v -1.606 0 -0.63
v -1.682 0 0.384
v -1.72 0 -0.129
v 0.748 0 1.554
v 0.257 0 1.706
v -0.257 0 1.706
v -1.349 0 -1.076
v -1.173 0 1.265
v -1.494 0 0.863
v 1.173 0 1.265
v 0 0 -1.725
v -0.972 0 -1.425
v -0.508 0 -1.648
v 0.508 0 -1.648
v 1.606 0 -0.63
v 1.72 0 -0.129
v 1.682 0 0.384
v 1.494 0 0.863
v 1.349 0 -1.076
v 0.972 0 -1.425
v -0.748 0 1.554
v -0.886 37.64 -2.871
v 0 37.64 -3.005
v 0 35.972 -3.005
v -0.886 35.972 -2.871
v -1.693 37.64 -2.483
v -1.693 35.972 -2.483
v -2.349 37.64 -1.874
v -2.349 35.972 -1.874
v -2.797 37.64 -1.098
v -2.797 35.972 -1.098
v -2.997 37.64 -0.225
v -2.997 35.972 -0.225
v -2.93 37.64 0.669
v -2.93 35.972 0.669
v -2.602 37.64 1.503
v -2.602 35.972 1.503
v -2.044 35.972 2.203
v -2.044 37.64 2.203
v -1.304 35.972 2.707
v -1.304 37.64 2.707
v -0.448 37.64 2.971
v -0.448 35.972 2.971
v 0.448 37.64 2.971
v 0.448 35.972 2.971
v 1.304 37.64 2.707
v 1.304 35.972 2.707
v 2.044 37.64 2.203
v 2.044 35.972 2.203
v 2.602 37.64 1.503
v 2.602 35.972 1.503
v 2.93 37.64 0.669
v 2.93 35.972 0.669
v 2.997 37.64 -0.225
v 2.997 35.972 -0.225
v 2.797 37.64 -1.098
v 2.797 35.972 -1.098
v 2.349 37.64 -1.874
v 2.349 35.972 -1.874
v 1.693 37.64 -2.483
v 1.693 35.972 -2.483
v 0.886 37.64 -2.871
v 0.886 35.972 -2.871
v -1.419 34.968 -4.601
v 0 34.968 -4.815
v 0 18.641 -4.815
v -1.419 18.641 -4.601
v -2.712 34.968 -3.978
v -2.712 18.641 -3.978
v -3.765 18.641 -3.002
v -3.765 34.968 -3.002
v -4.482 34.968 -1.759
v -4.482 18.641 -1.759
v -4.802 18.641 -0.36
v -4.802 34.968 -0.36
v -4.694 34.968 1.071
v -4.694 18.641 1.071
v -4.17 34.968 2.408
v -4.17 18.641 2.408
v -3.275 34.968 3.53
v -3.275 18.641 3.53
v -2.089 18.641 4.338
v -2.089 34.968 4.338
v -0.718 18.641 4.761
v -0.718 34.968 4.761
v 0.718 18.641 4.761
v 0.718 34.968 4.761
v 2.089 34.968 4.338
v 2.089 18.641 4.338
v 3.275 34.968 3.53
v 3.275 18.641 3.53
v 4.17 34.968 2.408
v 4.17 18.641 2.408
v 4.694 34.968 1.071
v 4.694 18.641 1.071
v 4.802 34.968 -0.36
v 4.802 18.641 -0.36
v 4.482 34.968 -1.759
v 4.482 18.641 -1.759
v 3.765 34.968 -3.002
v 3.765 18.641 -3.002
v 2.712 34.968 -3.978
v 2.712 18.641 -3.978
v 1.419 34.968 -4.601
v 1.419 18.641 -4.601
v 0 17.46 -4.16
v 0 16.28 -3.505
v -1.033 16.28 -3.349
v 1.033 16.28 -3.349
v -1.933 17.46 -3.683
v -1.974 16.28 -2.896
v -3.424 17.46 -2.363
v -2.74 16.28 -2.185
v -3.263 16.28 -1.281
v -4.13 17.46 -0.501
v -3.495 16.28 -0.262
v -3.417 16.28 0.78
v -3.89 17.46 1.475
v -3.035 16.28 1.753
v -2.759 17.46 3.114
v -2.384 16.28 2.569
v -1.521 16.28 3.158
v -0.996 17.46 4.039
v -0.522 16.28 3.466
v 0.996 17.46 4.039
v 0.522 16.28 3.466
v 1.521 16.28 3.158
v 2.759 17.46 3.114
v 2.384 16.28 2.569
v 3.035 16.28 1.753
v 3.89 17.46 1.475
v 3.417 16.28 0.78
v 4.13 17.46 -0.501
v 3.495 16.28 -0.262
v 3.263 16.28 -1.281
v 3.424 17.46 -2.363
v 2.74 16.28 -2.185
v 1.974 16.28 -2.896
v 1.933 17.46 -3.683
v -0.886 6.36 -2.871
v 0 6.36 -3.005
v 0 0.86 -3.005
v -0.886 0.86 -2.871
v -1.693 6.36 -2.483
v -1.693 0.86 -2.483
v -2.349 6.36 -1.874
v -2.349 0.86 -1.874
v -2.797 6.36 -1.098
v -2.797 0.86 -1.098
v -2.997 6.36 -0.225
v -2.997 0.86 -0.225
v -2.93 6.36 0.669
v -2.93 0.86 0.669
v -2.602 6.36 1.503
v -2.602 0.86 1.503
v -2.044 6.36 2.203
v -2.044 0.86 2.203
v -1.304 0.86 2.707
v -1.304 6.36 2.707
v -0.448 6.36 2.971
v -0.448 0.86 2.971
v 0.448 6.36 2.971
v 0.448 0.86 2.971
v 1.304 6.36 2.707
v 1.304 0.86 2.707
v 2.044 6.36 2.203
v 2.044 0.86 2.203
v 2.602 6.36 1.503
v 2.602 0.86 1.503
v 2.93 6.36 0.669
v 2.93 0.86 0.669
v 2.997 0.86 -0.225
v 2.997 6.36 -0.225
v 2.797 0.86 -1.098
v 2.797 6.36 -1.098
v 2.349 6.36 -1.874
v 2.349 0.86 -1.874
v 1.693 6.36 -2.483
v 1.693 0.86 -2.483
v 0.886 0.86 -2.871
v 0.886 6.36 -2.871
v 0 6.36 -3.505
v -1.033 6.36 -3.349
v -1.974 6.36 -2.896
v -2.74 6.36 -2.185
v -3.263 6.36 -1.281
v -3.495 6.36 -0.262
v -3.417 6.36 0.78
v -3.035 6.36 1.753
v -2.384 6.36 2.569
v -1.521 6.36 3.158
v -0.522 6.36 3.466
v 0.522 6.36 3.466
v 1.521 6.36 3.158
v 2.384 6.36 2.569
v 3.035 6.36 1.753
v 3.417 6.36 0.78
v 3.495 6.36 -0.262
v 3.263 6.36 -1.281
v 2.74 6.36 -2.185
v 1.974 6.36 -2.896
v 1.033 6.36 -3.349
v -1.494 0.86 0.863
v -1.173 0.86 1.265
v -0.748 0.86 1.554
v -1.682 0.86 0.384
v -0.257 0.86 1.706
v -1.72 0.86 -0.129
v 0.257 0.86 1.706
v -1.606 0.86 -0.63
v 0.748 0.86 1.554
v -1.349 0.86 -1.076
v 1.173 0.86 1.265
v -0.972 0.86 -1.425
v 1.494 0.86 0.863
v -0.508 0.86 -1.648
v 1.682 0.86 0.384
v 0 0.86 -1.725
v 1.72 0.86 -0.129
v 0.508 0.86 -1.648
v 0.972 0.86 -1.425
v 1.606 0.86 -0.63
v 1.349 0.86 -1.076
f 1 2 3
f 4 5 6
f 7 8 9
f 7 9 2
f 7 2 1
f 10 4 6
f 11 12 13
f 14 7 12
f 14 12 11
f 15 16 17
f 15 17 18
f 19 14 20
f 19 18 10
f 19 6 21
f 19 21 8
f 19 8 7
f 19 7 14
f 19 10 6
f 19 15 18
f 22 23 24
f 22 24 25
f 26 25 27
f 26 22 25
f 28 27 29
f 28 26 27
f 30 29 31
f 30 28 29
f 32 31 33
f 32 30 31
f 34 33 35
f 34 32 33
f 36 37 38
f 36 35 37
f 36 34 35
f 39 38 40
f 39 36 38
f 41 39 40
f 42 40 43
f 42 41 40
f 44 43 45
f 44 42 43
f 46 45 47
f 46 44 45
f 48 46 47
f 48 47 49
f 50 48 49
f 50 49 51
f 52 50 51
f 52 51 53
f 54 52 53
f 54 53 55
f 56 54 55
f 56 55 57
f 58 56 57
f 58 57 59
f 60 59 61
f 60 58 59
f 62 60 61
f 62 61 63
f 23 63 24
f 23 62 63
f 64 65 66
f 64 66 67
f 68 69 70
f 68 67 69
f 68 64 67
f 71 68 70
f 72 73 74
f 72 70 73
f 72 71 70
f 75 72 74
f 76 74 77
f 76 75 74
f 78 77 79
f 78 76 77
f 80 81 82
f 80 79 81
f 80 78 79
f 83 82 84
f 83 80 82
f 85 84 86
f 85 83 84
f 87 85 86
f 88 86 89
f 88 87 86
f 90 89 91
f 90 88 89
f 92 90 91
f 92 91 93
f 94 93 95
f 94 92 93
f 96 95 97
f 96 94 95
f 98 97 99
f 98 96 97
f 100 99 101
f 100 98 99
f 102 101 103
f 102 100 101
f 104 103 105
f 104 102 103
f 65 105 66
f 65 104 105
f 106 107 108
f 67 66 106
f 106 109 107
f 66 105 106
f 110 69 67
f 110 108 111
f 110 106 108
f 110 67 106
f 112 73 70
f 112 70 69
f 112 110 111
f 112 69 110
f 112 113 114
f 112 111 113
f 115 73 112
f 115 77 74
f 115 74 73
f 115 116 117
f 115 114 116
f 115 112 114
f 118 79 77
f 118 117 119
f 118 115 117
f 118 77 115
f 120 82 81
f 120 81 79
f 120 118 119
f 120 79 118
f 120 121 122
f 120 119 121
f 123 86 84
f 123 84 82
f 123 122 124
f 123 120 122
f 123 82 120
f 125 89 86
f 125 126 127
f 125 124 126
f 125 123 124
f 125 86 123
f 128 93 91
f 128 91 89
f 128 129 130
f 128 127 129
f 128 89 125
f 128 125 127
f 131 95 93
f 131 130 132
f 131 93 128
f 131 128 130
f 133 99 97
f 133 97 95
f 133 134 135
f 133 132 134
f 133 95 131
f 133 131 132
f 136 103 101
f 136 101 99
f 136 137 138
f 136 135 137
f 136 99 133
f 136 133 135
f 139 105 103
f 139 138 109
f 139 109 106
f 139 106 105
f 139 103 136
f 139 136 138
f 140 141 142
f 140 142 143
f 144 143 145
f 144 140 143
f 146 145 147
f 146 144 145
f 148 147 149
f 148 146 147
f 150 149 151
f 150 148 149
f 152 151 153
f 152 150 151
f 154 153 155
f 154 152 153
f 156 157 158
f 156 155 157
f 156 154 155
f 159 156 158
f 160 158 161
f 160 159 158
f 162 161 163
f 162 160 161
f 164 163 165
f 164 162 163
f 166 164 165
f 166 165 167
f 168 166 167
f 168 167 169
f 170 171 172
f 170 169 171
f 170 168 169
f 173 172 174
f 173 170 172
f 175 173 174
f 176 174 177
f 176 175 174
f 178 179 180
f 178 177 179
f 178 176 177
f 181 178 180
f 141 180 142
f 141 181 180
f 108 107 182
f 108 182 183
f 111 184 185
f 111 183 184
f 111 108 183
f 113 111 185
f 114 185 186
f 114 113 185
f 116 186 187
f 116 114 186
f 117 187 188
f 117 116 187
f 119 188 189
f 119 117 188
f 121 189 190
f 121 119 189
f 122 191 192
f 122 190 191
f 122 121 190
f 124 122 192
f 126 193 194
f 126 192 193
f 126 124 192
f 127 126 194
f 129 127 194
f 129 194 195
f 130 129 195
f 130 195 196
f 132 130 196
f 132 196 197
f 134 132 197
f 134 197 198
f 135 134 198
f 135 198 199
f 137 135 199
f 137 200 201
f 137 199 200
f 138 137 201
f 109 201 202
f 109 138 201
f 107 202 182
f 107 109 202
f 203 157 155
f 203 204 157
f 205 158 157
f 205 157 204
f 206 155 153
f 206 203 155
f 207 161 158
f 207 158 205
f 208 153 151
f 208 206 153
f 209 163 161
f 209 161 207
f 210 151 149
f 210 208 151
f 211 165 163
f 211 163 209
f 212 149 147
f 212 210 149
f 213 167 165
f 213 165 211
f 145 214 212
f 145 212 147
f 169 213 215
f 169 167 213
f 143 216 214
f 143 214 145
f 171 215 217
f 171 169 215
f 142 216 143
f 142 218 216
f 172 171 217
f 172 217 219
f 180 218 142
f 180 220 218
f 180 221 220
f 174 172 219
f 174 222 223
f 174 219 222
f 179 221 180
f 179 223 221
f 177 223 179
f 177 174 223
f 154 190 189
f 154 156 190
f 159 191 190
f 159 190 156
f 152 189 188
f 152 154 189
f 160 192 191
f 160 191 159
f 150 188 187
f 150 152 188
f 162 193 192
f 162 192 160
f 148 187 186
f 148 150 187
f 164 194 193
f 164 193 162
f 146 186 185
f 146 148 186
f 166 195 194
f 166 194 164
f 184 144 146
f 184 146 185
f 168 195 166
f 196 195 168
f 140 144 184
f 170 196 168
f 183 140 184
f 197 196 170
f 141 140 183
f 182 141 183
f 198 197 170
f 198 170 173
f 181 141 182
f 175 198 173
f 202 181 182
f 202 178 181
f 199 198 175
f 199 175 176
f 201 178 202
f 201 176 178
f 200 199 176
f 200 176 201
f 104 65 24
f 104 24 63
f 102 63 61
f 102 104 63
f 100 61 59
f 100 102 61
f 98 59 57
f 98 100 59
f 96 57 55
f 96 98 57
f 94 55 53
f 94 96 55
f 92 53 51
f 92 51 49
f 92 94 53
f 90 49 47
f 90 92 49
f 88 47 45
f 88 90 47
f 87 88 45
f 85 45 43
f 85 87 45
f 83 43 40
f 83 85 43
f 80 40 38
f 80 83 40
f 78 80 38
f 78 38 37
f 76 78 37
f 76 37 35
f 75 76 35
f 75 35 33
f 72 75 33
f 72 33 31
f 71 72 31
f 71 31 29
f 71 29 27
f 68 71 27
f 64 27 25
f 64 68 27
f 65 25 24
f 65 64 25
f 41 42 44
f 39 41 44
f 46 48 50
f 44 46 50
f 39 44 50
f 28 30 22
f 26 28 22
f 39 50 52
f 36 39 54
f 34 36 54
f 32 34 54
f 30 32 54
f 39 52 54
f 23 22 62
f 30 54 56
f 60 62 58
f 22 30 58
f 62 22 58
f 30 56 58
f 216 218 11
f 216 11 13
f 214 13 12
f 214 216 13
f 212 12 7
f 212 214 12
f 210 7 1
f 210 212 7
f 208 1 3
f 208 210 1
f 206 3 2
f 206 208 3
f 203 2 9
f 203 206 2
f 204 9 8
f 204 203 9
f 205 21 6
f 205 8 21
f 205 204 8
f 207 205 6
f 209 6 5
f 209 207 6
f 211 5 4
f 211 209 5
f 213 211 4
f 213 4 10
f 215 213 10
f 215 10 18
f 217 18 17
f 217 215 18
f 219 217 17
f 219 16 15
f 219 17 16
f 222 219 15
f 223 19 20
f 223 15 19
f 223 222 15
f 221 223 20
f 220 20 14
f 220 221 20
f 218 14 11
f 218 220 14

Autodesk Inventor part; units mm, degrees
ref_plane "YZ Plane" through (0, 0, 0) normal (1, 0, 0) x (0, 1, 0)
ref_plane "XZ Plane" through (0, 0, 0) normal (0, 1, 0) x (-1, 0, 0)
ref_plane "XY Plane" through (0, 0, 0) normal (0, 0, 1) x (1, 0, 0)
sketch "Sketch1" plane through (0, 0, 0) normal (1, 0, 0) x (0, 1, 0)
  line L0 (0, 0) -> (0, -1.725)
  line L1 (0, -1.725) -> (0.86, -1.725)
  line L2 (0.86, -1.725) -> (0.86, -3.005)
  line L3 (0.86, -3.005) -> (6.36, -3.005)
  line L4 (6.36, -3.005) -> (6.36, -3.505)
  line L5 (6.36, -3.505) -> (16.28, -3.505)
  line L6 (16.28, -3.505) -> (18.6408, -4.815)
  line L7 (18.6408, -4.815) -> (34.9681, -4.815)
  line L8 (34.9681, -4.815) -> (35.9725, -3.005)
  line L9 (35.9725, -3.005) -> (37.64, -3.005)
  line L10 (37.64, -3.005) -> (37.64, 0)
  line L11 (37.64, 0) -> (0, 0)
  dimension "d0" = 1.725
  dimension "d1" = 0.86
  dimension "d2" = 1.28
  dimension "d3" = 90
  dimension "d4" = 5.5
  dimension "d5" = 0.5
  dimension "d6" = 9.92
  dimension "d7" = 4.815
  dimension "d8" = 37.64
revolve "Revolution1" add sketch "Sketch1" angle 360 about axis through (0, 37.64, 0) along (0, -1, 0)
properties part number "00_RS_Pro_Micrometer_small"
